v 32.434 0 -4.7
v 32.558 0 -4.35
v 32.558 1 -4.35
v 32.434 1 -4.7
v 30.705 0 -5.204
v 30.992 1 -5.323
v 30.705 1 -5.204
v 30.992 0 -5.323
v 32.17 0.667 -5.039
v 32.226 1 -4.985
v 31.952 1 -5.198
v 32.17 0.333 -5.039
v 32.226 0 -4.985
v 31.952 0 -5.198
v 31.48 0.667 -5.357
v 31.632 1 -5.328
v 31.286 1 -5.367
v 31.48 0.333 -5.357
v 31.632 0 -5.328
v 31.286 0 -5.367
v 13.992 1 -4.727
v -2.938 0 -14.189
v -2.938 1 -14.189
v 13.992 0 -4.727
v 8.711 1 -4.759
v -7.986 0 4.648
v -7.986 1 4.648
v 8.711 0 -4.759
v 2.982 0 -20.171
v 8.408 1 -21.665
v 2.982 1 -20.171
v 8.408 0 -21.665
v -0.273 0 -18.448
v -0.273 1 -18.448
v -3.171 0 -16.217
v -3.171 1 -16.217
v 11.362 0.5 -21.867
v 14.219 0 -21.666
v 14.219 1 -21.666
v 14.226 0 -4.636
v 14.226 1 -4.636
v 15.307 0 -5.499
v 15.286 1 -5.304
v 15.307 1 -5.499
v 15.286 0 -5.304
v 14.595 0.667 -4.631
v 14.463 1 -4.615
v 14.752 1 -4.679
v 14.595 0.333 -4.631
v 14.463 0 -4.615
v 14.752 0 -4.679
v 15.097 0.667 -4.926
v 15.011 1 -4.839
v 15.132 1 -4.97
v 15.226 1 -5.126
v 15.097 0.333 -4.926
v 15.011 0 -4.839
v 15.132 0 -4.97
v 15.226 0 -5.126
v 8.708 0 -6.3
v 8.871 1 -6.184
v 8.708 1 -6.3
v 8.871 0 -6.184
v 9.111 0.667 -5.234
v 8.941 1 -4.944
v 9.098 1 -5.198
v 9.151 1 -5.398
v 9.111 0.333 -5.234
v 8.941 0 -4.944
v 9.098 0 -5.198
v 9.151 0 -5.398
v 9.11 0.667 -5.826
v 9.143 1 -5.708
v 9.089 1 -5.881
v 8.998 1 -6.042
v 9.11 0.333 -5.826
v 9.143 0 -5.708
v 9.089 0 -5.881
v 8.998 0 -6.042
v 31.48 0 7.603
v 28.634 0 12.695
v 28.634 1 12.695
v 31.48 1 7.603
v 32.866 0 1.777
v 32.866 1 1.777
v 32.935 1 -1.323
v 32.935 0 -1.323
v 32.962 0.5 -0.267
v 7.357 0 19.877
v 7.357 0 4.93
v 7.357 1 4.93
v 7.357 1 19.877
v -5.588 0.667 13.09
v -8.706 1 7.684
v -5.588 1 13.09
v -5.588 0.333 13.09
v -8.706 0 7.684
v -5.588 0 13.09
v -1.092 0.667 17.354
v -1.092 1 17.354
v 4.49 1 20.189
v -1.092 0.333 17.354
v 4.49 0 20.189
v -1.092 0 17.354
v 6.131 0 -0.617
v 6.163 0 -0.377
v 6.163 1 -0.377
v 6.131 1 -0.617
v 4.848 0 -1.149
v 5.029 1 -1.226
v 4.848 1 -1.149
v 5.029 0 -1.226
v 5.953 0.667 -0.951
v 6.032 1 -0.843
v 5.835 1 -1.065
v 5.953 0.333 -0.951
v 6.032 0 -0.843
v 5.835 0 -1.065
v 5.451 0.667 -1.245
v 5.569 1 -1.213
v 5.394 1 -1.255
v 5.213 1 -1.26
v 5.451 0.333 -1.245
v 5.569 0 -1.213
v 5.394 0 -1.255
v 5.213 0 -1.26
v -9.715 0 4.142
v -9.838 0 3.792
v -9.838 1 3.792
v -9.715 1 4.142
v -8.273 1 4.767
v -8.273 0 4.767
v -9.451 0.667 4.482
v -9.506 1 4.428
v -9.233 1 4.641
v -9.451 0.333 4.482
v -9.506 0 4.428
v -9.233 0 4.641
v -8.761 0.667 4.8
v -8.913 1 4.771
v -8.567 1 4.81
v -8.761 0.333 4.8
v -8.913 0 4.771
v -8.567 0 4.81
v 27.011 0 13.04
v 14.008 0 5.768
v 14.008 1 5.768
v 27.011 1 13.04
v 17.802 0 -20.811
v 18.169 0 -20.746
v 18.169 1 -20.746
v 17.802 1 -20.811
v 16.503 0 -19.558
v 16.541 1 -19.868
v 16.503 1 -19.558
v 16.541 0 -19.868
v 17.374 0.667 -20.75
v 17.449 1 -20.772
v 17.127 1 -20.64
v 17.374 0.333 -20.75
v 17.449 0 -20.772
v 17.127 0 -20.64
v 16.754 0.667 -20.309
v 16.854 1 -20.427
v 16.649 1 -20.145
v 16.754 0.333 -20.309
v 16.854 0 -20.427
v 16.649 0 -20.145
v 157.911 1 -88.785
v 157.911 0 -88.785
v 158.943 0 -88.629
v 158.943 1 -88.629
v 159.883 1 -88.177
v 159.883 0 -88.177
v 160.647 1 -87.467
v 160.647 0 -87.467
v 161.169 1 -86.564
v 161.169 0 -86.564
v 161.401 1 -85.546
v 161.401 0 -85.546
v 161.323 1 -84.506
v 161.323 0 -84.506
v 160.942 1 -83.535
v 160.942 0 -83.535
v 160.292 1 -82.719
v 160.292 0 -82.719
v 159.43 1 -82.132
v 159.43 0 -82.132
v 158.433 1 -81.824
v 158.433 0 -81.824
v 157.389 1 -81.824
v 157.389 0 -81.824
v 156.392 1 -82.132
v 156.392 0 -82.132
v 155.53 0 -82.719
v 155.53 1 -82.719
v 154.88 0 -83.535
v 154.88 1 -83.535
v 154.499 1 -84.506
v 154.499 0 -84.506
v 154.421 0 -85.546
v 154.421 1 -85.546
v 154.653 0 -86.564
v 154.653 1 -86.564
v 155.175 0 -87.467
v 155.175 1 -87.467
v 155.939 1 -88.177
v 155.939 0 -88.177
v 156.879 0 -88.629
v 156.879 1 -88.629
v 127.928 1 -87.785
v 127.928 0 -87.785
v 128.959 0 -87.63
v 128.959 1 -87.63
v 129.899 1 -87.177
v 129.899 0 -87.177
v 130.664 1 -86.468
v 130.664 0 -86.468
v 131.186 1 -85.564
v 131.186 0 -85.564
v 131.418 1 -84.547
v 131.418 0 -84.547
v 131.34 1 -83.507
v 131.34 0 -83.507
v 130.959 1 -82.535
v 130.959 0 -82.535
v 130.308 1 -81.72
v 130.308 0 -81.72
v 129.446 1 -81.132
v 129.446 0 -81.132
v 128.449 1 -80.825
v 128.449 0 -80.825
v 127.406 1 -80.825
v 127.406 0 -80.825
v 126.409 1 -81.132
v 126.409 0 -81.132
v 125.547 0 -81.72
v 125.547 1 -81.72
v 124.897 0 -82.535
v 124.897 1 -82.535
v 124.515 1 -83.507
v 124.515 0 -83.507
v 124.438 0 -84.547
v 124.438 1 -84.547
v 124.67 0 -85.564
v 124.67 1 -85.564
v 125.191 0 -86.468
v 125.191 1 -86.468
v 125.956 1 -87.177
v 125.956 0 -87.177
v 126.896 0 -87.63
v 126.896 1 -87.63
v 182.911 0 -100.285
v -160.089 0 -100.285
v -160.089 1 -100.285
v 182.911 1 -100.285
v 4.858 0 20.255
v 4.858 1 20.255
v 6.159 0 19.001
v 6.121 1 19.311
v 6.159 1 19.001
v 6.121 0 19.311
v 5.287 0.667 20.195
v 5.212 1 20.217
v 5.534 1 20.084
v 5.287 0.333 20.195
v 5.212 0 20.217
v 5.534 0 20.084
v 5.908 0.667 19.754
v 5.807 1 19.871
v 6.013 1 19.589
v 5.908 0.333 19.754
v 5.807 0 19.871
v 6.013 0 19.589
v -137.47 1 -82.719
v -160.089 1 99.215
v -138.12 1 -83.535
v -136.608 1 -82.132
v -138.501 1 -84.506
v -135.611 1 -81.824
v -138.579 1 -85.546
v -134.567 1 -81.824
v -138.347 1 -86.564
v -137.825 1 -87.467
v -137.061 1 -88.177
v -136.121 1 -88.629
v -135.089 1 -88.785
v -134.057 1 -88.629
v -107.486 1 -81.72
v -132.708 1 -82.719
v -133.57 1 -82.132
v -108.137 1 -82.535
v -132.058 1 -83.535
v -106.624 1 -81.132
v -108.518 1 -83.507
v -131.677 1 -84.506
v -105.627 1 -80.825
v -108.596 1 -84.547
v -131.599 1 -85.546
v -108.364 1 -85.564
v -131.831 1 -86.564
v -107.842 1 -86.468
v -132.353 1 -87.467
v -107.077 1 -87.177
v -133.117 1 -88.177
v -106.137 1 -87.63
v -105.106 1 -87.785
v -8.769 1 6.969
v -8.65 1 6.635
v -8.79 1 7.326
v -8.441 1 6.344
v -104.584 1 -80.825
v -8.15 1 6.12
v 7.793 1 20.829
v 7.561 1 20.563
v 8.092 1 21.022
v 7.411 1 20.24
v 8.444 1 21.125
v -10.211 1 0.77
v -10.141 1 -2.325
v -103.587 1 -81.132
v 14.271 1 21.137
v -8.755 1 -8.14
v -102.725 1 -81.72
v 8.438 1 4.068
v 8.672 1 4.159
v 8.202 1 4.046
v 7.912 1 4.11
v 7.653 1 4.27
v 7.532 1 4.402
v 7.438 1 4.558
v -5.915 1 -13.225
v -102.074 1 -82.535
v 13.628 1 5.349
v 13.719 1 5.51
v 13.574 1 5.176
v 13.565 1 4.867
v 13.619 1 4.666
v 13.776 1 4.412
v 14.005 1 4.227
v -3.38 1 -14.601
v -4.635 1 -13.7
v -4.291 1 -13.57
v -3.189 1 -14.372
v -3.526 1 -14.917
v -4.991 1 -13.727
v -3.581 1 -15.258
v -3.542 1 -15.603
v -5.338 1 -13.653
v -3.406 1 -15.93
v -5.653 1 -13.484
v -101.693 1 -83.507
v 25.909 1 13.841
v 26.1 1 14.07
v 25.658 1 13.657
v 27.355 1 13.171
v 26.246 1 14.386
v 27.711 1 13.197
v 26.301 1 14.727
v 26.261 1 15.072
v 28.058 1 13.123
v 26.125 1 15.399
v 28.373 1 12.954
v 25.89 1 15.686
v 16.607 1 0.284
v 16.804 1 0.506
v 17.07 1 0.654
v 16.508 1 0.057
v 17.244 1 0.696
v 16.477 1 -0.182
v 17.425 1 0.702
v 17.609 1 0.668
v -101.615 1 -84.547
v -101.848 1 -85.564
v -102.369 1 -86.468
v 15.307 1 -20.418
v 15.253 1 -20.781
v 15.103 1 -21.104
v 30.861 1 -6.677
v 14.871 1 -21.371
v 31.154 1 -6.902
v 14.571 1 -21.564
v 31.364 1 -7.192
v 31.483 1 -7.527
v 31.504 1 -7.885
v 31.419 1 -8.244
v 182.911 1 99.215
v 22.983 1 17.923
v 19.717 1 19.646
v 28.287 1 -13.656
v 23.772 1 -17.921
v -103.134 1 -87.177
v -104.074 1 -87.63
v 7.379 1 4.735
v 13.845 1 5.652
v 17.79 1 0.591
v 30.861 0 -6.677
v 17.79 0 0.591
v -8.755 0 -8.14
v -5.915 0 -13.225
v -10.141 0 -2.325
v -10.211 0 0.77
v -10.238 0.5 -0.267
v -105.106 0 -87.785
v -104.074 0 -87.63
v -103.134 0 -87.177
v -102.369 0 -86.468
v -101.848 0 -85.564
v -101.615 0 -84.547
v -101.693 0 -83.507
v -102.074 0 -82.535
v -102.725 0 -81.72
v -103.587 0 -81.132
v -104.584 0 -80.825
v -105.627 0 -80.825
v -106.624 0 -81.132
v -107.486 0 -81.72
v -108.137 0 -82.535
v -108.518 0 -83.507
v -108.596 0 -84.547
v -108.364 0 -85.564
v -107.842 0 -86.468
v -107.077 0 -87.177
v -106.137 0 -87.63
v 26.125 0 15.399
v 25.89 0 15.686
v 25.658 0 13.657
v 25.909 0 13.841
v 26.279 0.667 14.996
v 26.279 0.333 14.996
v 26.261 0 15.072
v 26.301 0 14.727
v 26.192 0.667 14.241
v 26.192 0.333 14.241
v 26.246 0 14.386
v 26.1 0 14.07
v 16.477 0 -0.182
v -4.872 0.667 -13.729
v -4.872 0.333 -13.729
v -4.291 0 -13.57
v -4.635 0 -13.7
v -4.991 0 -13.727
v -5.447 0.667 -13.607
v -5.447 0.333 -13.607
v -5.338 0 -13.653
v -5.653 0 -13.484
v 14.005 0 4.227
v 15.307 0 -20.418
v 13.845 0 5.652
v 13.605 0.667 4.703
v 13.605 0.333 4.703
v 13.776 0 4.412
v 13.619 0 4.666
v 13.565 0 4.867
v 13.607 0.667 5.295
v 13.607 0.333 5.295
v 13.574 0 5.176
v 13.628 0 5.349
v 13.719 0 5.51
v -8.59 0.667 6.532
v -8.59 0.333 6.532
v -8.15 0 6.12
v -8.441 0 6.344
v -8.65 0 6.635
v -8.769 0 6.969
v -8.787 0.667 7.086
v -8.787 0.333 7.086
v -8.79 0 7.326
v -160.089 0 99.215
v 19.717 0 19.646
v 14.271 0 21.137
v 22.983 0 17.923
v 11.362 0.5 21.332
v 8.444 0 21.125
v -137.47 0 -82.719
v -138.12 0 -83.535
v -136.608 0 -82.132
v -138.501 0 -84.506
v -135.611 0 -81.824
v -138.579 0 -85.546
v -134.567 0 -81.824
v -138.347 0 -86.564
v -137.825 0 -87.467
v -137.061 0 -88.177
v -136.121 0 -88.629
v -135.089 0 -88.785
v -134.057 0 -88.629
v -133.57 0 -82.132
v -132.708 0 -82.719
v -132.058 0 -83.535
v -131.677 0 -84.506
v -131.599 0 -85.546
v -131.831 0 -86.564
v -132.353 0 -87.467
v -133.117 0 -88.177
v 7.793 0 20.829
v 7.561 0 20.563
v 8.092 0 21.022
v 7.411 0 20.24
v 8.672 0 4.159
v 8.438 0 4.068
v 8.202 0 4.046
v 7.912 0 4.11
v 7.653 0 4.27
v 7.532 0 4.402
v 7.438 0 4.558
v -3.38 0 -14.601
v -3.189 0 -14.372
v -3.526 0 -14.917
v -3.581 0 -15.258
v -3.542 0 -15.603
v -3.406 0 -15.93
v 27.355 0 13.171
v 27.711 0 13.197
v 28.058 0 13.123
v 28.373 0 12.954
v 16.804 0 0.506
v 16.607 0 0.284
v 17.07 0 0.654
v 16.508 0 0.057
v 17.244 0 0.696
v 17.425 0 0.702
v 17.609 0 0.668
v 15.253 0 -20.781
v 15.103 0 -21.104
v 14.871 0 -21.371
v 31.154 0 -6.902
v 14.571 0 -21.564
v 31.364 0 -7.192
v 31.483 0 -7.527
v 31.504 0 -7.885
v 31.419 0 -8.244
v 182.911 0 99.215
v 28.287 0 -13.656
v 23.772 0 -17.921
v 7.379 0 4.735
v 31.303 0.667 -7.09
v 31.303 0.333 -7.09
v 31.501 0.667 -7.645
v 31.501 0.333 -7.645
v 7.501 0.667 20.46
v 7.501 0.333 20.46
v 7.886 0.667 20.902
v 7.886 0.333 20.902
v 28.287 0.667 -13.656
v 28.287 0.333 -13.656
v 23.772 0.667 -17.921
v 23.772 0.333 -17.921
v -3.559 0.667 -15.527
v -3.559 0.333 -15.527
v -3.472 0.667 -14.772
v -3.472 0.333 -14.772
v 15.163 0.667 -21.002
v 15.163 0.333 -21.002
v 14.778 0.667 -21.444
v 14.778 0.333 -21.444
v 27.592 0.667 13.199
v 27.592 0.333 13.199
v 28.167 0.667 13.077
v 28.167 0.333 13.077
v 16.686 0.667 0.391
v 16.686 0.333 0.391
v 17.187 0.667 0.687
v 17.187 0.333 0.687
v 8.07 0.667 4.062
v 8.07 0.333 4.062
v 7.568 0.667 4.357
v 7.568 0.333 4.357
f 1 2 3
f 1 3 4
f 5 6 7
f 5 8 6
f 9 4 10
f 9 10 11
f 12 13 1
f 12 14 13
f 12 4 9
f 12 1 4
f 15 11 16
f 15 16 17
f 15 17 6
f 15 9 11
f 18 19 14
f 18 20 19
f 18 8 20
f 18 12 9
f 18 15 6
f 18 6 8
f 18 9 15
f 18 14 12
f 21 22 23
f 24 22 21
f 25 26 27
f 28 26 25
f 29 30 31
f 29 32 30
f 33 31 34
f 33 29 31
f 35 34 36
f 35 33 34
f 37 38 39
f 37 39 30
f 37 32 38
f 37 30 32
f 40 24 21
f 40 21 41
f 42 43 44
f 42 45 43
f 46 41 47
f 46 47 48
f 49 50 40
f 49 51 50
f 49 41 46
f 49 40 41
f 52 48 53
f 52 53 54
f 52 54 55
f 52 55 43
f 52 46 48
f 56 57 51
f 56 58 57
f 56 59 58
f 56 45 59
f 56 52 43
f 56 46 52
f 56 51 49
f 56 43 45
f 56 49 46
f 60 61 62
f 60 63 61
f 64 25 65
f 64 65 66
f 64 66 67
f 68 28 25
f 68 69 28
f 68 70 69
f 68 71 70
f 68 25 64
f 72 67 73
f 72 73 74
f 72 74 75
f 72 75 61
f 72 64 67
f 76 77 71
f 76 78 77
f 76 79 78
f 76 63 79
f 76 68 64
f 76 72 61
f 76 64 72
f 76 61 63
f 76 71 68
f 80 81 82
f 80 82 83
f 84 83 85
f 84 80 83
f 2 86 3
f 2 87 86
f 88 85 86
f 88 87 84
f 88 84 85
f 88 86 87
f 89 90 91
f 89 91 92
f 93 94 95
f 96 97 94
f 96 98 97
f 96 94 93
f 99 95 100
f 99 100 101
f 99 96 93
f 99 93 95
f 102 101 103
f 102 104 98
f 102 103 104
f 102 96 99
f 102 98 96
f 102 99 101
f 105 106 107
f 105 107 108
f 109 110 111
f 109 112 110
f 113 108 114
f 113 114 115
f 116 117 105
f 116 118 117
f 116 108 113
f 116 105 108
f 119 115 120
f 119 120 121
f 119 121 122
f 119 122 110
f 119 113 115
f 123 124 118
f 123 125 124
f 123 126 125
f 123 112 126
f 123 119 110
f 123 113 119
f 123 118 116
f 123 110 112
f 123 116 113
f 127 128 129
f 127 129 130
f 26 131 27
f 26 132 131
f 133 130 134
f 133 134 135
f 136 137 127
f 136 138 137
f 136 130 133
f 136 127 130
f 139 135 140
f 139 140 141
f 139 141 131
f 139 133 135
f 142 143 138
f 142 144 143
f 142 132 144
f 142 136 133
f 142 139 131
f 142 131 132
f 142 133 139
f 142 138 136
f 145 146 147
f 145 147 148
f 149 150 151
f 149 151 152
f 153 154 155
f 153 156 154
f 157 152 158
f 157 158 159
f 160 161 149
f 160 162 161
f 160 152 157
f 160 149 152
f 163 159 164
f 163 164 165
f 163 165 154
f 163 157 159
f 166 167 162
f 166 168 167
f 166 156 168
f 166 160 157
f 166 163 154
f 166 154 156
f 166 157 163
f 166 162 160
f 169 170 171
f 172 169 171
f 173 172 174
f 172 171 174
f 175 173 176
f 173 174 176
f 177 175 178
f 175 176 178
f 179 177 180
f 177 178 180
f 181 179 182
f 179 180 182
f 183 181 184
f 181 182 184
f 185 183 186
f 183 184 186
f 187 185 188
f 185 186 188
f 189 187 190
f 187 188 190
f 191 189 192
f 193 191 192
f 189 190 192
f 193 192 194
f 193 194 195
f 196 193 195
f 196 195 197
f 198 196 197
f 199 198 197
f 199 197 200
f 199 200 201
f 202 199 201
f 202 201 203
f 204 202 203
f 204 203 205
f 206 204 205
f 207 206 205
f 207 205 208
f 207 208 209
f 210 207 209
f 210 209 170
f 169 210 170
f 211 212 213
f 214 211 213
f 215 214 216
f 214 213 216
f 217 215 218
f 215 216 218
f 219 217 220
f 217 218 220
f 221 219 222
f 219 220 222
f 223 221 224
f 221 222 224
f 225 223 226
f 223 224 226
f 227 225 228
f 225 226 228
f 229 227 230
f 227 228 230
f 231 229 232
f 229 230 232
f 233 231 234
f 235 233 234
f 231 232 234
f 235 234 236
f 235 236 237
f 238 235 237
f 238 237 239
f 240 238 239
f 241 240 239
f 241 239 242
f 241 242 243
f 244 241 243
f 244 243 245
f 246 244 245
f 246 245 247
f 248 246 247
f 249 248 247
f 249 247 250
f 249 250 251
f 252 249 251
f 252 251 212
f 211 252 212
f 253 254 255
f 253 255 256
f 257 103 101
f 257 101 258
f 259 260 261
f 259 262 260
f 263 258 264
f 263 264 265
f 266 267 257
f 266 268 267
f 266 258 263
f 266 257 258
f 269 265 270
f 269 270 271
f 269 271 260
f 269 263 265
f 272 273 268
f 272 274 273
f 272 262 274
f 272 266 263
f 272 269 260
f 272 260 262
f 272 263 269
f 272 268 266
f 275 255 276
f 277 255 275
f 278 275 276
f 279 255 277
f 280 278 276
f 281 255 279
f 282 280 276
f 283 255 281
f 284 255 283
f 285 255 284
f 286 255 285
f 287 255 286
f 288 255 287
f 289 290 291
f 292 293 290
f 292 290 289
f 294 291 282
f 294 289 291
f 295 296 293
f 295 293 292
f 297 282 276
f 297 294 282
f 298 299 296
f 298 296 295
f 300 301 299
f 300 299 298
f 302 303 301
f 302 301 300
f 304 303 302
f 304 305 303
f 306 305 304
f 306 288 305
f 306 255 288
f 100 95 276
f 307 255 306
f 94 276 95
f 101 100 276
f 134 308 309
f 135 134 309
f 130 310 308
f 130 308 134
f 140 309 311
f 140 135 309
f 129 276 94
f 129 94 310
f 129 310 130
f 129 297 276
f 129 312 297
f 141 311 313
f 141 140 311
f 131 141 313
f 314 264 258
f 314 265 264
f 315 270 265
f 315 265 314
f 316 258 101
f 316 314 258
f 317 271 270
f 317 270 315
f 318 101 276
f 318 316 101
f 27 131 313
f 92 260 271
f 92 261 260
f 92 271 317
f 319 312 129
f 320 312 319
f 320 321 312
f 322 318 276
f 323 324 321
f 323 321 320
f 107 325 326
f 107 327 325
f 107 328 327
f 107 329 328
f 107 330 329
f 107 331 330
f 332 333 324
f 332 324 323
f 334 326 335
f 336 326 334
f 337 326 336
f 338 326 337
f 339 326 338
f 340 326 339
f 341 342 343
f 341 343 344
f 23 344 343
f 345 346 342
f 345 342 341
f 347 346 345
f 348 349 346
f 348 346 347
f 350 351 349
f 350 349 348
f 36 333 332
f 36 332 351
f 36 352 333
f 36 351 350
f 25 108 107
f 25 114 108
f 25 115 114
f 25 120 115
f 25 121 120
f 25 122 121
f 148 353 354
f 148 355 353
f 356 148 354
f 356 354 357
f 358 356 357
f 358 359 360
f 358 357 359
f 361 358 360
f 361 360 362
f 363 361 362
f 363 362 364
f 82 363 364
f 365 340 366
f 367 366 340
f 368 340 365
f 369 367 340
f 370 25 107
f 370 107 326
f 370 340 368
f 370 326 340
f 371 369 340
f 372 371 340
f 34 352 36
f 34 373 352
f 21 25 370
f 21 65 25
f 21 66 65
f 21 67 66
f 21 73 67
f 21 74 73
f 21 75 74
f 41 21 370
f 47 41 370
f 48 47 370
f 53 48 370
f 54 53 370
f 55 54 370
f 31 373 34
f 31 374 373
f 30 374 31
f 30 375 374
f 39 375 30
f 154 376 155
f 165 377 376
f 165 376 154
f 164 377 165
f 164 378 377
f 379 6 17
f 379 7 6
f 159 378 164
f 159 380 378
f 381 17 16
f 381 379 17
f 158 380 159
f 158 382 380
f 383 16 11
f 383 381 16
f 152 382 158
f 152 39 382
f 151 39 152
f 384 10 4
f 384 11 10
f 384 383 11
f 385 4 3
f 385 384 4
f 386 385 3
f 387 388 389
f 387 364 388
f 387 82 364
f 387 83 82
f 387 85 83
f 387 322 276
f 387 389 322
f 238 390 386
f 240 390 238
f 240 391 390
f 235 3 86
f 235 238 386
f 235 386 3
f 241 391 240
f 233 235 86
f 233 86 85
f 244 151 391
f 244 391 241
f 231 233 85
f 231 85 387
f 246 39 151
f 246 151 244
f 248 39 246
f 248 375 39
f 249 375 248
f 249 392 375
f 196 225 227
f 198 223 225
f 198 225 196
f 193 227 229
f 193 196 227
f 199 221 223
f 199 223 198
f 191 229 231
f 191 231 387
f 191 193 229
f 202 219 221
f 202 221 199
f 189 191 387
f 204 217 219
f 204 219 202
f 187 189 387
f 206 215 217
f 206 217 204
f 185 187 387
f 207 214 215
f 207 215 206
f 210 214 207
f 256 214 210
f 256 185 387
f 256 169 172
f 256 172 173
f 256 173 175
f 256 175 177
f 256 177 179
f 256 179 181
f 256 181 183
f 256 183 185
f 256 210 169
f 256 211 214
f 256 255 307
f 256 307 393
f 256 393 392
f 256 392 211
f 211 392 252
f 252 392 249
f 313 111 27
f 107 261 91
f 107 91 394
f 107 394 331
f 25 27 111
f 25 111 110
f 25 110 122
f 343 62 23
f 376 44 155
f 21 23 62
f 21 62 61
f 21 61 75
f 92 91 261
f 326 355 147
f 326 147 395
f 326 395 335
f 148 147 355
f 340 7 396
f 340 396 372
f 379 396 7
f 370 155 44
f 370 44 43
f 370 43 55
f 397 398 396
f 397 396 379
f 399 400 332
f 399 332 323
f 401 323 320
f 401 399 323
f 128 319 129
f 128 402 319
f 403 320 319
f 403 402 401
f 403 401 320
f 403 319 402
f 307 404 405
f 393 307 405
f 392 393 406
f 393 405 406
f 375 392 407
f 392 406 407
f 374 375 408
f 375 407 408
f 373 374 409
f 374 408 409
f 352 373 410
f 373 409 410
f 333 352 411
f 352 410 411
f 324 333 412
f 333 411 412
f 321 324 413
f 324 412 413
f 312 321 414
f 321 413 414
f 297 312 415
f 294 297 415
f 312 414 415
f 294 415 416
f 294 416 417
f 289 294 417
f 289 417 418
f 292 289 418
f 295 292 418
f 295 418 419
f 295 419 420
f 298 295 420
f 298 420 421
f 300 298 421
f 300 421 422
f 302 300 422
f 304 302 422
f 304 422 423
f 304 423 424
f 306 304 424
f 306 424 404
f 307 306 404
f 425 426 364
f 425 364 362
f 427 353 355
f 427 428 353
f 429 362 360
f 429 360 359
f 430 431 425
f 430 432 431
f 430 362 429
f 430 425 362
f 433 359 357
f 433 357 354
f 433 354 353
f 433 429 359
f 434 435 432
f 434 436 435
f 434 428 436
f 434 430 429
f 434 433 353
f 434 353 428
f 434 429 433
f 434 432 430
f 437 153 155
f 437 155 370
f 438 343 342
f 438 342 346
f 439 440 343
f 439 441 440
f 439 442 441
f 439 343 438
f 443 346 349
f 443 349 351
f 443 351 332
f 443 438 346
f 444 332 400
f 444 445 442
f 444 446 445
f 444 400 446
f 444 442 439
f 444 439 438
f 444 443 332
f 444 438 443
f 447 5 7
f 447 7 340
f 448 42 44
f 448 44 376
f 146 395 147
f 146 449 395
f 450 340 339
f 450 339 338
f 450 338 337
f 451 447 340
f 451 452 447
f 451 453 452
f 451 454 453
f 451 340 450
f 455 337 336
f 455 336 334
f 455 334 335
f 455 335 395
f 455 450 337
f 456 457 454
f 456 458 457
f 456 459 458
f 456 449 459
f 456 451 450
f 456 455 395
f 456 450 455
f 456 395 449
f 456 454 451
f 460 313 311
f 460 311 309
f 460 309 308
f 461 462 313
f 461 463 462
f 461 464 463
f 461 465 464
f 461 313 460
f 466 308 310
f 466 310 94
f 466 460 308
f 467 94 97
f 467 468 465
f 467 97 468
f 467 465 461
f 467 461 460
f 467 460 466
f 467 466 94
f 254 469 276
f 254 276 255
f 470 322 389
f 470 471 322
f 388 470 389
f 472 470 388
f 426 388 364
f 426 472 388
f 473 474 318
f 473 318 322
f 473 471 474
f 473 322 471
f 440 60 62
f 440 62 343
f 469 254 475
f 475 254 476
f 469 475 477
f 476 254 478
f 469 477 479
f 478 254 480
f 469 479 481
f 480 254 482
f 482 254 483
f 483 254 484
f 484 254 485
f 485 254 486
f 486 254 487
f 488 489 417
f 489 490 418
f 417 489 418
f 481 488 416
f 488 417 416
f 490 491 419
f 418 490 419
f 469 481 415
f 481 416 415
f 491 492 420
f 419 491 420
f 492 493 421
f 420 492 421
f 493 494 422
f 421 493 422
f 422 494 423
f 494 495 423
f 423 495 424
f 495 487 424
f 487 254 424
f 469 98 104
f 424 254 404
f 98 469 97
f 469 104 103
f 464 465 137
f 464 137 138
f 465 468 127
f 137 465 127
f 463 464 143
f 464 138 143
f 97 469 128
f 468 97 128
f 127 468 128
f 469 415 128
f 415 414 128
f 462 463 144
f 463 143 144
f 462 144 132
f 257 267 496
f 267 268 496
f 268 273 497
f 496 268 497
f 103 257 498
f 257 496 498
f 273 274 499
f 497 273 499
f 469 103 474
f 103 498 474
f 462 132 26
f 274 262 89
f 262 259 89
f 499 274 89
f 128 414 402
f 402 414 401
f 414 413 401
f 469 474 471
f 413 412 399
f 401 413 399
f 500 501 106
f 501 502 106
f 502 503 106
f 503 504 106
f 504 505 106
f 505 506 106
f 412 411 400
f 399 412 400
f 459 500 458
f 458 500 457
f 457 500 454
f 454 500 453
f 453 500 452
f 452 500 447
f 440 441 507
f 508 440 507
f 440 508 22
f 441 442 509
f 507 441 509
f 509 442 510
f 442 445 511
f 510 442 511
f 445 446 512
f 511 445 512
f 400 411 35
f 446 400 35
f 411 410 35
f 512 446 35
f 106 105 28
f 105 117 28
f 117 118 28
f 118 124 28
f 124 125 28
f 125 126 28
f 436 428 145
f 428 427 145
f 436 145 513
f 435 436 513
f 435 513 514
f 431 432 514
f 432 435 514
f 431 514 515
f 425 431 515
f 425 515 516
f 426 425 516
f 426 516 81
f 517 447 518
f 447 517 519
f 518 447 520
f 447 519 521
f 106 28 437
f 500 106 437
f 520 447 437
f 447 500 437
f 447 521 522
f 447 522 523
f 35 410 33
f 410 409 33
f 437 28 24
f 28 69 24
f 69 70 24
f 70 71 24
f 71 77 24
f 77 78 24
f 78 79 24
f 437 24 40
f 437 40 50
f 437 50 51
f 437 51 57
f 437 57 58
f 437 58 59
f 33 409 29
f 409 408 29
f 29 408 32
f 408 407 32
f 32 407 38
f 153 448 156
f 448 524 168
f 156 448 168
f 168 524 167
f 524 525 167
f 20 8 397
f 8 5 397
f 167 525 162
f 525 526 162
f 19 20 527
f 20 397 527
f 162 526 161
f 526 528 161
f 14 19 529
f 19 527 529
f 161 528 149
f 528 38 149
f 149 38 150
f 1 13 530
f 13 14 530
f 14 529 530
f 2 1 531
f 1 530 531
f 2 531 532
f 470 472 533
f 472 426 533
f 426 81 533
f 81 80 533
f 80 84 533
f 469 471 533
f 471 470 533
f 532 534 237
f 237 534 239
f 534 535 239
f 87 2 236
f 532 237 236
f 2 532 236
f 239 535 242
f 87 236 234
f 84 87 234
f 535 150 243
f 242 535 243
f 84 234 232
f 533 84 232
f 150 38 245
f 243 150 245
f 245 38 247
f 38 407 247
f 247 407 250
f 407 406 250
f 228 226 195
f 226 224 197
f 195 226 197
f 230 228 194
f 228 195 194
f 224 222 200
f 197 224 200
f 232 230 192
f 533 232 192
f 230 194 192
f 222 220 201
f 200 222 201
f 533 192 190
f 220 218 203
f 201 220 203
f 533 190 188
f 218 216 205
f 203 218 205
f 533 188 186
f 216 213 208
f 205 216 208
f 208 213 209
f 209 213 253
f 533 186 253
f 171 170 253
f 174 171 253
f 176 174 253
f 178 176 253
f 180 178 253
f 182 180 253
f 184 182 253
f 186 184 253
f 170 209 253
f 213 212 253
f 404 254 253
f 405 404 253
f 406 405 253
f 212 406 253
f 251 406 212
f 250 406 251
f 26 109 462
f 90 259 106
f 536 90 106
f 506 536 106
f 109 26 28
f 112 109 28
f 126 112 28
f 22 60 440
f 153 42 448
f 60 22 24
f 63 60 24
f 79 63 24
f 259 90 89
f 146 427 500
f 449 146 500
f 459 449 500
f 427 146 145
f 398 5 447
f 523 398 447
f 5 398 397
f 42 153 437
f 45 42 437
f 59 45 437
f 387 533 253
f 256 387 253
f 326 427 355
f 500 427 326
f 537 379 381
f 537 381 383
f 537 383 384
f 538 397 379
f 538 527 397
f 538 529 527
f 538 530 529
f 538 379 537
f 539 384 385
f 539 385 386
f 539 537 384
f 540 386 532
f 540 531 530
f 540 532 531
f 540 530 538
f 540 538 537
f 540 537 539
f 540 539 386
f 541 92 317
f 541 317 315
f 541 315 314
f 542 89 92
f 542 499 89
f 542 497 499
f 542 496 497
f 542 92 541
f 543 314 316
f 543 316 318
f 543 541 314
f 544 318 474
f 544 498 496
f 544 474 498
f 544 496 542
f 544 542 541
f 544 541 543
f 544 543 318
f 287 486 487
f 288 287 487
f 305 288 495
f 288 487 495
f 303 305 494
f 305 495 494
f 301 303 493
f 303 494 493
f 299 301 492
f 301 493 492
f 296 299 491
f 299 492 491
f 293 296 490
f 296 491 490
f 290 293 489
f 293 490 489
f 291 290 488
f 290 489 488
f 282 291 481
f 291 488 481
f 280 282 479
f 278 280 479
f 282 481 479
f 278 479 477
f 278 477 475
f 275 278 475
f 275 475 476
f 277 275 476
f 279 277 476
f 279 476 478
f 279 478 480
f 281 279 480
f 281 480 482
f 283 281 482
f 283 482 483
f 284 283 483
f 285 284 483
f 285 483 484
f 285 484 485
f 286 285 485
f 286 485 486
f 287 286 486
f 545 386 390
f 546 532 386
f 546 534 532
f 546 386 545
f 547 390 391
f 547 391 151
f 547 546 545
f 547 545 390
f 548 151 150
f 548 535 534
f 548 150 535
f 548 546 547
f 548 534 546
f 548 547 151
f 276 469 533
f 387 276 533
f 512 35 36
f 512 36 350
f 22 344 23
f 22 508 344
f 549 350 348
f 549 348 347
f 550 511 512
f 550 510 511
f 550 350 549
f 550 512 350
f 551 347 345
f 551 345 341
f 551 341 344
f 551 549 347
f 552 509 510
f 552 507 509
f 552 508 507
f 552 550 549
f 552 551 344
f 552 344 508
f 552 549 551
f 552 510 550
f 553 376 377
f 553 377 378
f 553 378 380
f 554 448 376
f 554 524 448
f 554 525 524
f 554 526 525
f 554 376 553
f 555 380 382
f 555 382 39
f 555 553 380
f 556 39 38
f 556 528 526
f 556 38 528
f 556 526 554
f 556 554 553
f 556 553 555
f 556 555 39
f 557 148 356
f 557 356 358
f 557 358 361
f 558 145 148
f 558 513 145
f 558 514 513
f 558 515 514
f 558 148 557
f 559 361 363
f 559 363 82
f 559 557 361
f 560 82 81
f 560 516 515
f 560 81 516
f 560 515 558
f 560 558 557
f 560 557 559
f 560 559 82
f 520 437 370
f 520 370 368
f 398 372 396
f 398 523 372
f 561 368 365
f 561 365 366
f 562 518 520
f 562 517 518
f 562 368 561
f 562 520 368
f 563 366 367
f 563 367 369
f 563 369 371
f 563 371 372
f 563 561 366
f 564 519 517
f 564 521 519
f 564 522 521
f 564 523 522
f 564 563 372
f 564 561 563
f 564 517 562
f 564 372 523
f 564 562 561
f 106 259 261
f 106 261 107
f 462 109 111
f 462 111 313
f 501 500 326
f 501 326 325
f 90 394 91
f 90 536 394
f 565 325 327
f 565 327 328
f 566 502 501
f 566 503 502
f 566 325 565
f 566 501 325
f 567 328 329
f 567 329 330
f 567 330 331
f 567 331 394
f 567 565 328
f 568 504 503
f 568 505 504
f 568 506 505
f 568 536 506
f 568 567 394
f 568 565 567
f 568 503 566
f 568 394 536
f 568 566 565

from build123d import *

# Parameters (mm, degrees)
SKETCH1_W            = 343
SKETCH1_H            = 199.5
BOSS_EXTRUDE1_DEPTH  = 1
M6_CLEARANCE_HOLE1_D = 7


with BuildPart() as part:
    # Sketch1 → Boss-Extrude1 (new body)
    with BuildSketch(Plane(origin=(0, 0, 0), x_dir=(1, 0, 0), z_dir=(0, 1, 0))):
        with Locations((11.41106981, 0.534905995)):
            Rectangle(SKETCH1_W, SKETCH1_H)
        with BuildLine():
            Line((-7.985757833, -4.648175221), (8.711031725, 4.759089682))
            add(Edge.make_bspline(
                [(8.711031725, 4.759089682), (9.311815171, 5.097749627), (9.310461275, 5.963705422), (8.708323934, 6.300339691)],
                knots=[5, 5, 5, 5, 6, 6, 6, 6], degree=3))
            Line((8.708323934, 6.300339691), (-4.290635533, 13.569700018))
            add(Edge.make_bspline(
                [(-4.290635533, 13.569700018), (-4.841299002, 13.877540751), (-5.535211865, 13.729542386), (-5.914514518, 13.224942375)],
                knots=[0, 0, 0, 0, 1, 1, 1, 1], degree=3))
            add(Edge.make_bspline(
                [(-5.914514518, 13.224942375), (-8.626837761, 9.614826119), (-10.237508511, 5.130289637), (-10.237508511, 0.267137786)],
                knots=[1, 1, 1, 1, 2, 2, 2, 2], degree=3))
            add(Edge.make_bspline(
                [(-10.237508511, 0.267137786), (-10.237508511, -1.12306501), (-10.095266787, -2.478045848), (-9.837887089, -3.792378812)],
                knots=[2, 2, 2, 2, 3, 3, 3, 3], degree=3))
            add(Edge.make_bspline(
                [(-9.837887089, -3.792378812), (-9.673300918, -4.634295207), (-8.732839522, -5.069133419), (-7.985757833, -4.648175221)],
                knots=[3, 3, 3, 3, 4, 4, 4, 4], degree=3))
        make_face(mode=Mode.SUBTRACT)
        with BuildLine():
            Line((17.789899426, -0.591423265), (30.86115737, 6.677229102))
            add(Edge.make_bspline(
                [(30.86115737, 6.677229102), (31.413846515, 6.984728777), (31.653279344, 7.656292027), (31.419262097, 8.244213464)],
                knots=[1, 1, 1, 1, 2, 2, 2, 2], degree=3))
            add(Edge.make_bspline(
                [(31.419262097, 8.244213464), (29.075058949, 14.133504536), (24.219017634, 18.737245846), (18.168855853, 20.745837898)],
                knots=[2, 2, 2, 2, 3, 3, 3, 3], degree=3))
            add(Edge.make_bspline(
                [(18.168855853, 20.745837898), (17.350994359, 21.017443836), (16.504344496, 20.419714407), (16.502990601, 19.558161356)],
                knots=[3, 3, 3, 3, 4, 4, 4, 4], degree=3))
            Line((16.502990601, 19.558161356), (16.476574133, 0.182074892))
            add(Edge.make_bspline(
                [(16.476574133, 0.182074892), (16.475897185, -0.492537207), (17.200288203, -0.919252045), (17.789899426, -0.591423265)],
                knots=[5, 5, 5, 5, 6, 6, 6, 6], degree=3))
        make_face(mode=Mode.SUBTRACT)
        with BuildLine():
            Line((14.008386181, -5.768334993), (27.011157828, -13.039827191))
            add(Edge.make_bspline(
                [(27.011157828, -13.039827191), (27.561480239, -13.347667924), (28.25539827, -13.199679894), (28.634354697, -12.695410606)],
                knots=[1, 1, 1, 1, 2, 2, 2, 2], degree=3))
            add(Edge.make_bspline(
                [(28.634354697, -12.695410606), (31.349401234, -9.084963628), (32.961756602, -4.598391135), (32.961756602, 0.267137786)],
                knots=[2, 2, 2, 2, 3, 3, 3, 3], degree=3))
            add(Edge.make_bspline(
                [(32.961756602, 0.267137786), (32.961756602, 1.665463955), (32.818160982, 3.02822711), (32.558068326, 4.350022002)],
                knots=[3, 3, 3, 3, 4, 4, 4, 4], degree=3))
            add(Edge.make_bspline(
                [(32.558068326, 4.350022002), (32.392469317, 5.191587005), (31.451666864, 5.626094494), (30.704585174, 5.204123458)],
                knots=[4, 4, 4, 4, 5, 5, 5, 5], degree=3))
            Line((30.704585174, 5.204123458), (14.004996275, -4.227436377))
            add(Edge.make_bspline(
                [(14.004996275, -4.227436377), (13.404889777, -4.56643738), (13.40658473, -5.431711059), (14.008386181, -5.768334993)],
                knots=[6, 6, 6, 6, 7, 7, 7, 7], degree=3))
        make_face(mode=Mode.SUBTRACT)
        with BuildLine():
            Line((15.306606753, 5.498905809), (15.306606753, 20.417885097))
            add(Edge.make_bspline(
                [(15.306606753, 20.417885097), (15.306606753, 21.047115854), (14.841962166, 21.580168344), (14.218829107, 21.665846168)],
                knots=[1, 1, 1, 1, 2, 2, 2, 2], degree=3))
            add(Edge.make_bspline(
                [(14.218829107, 21.665846168), (13.284129519, 21.794538601), (12.331813785, 21.867018527), (11.362233297, 21.867018527)],
                knots=[2, 2, 2, 2, 3, 3, 3, 3], degree=3))
            add(Edge.make_bspline(
                [(11.362233297, 21.867018527), (5.758087119, 21.867018527), (0.665320765, 19.719905379), (-3.170684195, 16.217149949)],
                knots=[3, 3, 3, 3, 4, 4, 4, 4], degree=3))
            add(Edge.make_bspline(
                [(-3.170684195, 16.217149949), (-3.804989477, 15.638044336), (-3.687474435, 14.607502371), (-2.938020844, 14.188580184)],
                knots=[4, 4, 4, 4, 5, 5, 5, 5], degree=3))
            Line((-2.938020844, 14.188580184), (13.991927564, 4.727433328))
            add(Edge.make_bspline(
                [(13.991927564, 4.727433328), (14.580856672, 4.398260987), (15.306606753, 4.823952653), (15.306606753, 5.498905809)],
                knots=[6, 6, 6, 6, 7, 7, 7, 7], degree=3))
        make_face(mode=Mode.SUBTRACT)
        with BuildLine():
            Line((7.357446123, -4.930131749), (7.357446123, -19.87689174))
            add(Edge.make_bspline(
                [(7.357446123, -19.87689174), (7.357787181, -20.505445549), (7.821408594, -21.037815923), (8.443869873, -21.124852811)],
                knots=[1, 1, 1, 1, 2, 2, 2, 2], degree=3))
            add(Edge.make_bspline(
                [(8.443869873, -21.124852811), (9.397870225, -21.257947988), (10.37084062, -21.332112532), (11.361763051, -21.332112532)],
                knots=[2, 2, 2, 2, 3, 3, 3, 3], degree=3))
            add(Edge.make_bspline(
                [(11.361763051, -21.332112532), (16.964214275, -21.332112532), (22.054608728, -19.186699506), (25.890267463, -15.686310809)],
                knots=[3, 3, 3, 3, 4, 4, 4, 4], degree=3))
            add(Edge.make_bspline(
                [(25.890267463, -15.686310809), (26.52458308, -15.107541086), (26.407403928, -14.076663231), (25.657955505, -13.657405154)],
                knots=[4, 4, 4, 4, 5, 5, 5, 5], degree=3))
            Line((25.657955505, -13.657405154), (8.672461202, -4.158669603))
            add(Edge.make_bspline(
                [(8.672461202, -4.158669603), (8.083532094, -3.829486928), (7.357446123, -4.255188928), (7.357446123, -4.930131749)],
                knots=[6, 6, 6, 6, 7, 7, 7, 7], degree=3))
        make_face(mode=Mode.SUBTRACT)
        with BuildLine():
            Line((4.847907511, 1.148952756), (-8.149526948, -6.119709946))
            add(Edge.make_bspline(
                [(-8.149526948, -6.119709946), (-8.700185249, -6.427891736), (-8.938264182, -7.097418975), (-8.705605999, -7.683976181)],
                knots=[1, 1, 1, 1, 2, 2, 2, 2], degree=3))
            add(Edge.make_bspline(
                [(-8.705605999, -7.683976181), (-6.373928969, -13.563789984), (-1.538542313, -18.16516456), (4.489941634, -20.188659799)],
                knots=[2, 2, 2, 2, 3, 3, 3, 3], degree=3))
            add(Edge.make_bspline(
                [(4.489941634, -20.188659799), (5.308821133, -20.463650476), (6.158855735, -19.864220926), (6.158855735, -19.000637033)],
                knots=[3, 3, 3, 3, 4, 4, 4, 4], degree=3))
            Line((6.158855735, -19.000637033), (6.16292259, 0.377480275))
            add(Edge.make_bspline(
                [(6.16292259, 0.377480275), (6.16325848, 1.052433432), (5.437172508, 1.478466155), (4.847907511, 1.148952756)],
                knots=[5, 5, 5, 5, 6, 6, 6, 6], degree=3))
        make_face(mode=Mode.SUBTRACT)
    extrude(amount=BOSS_EXTRUDE1_DEPTH)

    # M6 Clearance Hole1 (through all)
    with Locations(Plane(origin=(-135.08893019, 1, -85.284905995), x_dir=(0, 0, 1), z_dir=(0, 1, 0))):
        with Locations((0, 0), (0.999444907, 29.983347209), (0.999444907, 263.016652791), (0, 293)):
            Hole(M6_CLEARANCE_HOLE1_D / 2)


solid = part.part
